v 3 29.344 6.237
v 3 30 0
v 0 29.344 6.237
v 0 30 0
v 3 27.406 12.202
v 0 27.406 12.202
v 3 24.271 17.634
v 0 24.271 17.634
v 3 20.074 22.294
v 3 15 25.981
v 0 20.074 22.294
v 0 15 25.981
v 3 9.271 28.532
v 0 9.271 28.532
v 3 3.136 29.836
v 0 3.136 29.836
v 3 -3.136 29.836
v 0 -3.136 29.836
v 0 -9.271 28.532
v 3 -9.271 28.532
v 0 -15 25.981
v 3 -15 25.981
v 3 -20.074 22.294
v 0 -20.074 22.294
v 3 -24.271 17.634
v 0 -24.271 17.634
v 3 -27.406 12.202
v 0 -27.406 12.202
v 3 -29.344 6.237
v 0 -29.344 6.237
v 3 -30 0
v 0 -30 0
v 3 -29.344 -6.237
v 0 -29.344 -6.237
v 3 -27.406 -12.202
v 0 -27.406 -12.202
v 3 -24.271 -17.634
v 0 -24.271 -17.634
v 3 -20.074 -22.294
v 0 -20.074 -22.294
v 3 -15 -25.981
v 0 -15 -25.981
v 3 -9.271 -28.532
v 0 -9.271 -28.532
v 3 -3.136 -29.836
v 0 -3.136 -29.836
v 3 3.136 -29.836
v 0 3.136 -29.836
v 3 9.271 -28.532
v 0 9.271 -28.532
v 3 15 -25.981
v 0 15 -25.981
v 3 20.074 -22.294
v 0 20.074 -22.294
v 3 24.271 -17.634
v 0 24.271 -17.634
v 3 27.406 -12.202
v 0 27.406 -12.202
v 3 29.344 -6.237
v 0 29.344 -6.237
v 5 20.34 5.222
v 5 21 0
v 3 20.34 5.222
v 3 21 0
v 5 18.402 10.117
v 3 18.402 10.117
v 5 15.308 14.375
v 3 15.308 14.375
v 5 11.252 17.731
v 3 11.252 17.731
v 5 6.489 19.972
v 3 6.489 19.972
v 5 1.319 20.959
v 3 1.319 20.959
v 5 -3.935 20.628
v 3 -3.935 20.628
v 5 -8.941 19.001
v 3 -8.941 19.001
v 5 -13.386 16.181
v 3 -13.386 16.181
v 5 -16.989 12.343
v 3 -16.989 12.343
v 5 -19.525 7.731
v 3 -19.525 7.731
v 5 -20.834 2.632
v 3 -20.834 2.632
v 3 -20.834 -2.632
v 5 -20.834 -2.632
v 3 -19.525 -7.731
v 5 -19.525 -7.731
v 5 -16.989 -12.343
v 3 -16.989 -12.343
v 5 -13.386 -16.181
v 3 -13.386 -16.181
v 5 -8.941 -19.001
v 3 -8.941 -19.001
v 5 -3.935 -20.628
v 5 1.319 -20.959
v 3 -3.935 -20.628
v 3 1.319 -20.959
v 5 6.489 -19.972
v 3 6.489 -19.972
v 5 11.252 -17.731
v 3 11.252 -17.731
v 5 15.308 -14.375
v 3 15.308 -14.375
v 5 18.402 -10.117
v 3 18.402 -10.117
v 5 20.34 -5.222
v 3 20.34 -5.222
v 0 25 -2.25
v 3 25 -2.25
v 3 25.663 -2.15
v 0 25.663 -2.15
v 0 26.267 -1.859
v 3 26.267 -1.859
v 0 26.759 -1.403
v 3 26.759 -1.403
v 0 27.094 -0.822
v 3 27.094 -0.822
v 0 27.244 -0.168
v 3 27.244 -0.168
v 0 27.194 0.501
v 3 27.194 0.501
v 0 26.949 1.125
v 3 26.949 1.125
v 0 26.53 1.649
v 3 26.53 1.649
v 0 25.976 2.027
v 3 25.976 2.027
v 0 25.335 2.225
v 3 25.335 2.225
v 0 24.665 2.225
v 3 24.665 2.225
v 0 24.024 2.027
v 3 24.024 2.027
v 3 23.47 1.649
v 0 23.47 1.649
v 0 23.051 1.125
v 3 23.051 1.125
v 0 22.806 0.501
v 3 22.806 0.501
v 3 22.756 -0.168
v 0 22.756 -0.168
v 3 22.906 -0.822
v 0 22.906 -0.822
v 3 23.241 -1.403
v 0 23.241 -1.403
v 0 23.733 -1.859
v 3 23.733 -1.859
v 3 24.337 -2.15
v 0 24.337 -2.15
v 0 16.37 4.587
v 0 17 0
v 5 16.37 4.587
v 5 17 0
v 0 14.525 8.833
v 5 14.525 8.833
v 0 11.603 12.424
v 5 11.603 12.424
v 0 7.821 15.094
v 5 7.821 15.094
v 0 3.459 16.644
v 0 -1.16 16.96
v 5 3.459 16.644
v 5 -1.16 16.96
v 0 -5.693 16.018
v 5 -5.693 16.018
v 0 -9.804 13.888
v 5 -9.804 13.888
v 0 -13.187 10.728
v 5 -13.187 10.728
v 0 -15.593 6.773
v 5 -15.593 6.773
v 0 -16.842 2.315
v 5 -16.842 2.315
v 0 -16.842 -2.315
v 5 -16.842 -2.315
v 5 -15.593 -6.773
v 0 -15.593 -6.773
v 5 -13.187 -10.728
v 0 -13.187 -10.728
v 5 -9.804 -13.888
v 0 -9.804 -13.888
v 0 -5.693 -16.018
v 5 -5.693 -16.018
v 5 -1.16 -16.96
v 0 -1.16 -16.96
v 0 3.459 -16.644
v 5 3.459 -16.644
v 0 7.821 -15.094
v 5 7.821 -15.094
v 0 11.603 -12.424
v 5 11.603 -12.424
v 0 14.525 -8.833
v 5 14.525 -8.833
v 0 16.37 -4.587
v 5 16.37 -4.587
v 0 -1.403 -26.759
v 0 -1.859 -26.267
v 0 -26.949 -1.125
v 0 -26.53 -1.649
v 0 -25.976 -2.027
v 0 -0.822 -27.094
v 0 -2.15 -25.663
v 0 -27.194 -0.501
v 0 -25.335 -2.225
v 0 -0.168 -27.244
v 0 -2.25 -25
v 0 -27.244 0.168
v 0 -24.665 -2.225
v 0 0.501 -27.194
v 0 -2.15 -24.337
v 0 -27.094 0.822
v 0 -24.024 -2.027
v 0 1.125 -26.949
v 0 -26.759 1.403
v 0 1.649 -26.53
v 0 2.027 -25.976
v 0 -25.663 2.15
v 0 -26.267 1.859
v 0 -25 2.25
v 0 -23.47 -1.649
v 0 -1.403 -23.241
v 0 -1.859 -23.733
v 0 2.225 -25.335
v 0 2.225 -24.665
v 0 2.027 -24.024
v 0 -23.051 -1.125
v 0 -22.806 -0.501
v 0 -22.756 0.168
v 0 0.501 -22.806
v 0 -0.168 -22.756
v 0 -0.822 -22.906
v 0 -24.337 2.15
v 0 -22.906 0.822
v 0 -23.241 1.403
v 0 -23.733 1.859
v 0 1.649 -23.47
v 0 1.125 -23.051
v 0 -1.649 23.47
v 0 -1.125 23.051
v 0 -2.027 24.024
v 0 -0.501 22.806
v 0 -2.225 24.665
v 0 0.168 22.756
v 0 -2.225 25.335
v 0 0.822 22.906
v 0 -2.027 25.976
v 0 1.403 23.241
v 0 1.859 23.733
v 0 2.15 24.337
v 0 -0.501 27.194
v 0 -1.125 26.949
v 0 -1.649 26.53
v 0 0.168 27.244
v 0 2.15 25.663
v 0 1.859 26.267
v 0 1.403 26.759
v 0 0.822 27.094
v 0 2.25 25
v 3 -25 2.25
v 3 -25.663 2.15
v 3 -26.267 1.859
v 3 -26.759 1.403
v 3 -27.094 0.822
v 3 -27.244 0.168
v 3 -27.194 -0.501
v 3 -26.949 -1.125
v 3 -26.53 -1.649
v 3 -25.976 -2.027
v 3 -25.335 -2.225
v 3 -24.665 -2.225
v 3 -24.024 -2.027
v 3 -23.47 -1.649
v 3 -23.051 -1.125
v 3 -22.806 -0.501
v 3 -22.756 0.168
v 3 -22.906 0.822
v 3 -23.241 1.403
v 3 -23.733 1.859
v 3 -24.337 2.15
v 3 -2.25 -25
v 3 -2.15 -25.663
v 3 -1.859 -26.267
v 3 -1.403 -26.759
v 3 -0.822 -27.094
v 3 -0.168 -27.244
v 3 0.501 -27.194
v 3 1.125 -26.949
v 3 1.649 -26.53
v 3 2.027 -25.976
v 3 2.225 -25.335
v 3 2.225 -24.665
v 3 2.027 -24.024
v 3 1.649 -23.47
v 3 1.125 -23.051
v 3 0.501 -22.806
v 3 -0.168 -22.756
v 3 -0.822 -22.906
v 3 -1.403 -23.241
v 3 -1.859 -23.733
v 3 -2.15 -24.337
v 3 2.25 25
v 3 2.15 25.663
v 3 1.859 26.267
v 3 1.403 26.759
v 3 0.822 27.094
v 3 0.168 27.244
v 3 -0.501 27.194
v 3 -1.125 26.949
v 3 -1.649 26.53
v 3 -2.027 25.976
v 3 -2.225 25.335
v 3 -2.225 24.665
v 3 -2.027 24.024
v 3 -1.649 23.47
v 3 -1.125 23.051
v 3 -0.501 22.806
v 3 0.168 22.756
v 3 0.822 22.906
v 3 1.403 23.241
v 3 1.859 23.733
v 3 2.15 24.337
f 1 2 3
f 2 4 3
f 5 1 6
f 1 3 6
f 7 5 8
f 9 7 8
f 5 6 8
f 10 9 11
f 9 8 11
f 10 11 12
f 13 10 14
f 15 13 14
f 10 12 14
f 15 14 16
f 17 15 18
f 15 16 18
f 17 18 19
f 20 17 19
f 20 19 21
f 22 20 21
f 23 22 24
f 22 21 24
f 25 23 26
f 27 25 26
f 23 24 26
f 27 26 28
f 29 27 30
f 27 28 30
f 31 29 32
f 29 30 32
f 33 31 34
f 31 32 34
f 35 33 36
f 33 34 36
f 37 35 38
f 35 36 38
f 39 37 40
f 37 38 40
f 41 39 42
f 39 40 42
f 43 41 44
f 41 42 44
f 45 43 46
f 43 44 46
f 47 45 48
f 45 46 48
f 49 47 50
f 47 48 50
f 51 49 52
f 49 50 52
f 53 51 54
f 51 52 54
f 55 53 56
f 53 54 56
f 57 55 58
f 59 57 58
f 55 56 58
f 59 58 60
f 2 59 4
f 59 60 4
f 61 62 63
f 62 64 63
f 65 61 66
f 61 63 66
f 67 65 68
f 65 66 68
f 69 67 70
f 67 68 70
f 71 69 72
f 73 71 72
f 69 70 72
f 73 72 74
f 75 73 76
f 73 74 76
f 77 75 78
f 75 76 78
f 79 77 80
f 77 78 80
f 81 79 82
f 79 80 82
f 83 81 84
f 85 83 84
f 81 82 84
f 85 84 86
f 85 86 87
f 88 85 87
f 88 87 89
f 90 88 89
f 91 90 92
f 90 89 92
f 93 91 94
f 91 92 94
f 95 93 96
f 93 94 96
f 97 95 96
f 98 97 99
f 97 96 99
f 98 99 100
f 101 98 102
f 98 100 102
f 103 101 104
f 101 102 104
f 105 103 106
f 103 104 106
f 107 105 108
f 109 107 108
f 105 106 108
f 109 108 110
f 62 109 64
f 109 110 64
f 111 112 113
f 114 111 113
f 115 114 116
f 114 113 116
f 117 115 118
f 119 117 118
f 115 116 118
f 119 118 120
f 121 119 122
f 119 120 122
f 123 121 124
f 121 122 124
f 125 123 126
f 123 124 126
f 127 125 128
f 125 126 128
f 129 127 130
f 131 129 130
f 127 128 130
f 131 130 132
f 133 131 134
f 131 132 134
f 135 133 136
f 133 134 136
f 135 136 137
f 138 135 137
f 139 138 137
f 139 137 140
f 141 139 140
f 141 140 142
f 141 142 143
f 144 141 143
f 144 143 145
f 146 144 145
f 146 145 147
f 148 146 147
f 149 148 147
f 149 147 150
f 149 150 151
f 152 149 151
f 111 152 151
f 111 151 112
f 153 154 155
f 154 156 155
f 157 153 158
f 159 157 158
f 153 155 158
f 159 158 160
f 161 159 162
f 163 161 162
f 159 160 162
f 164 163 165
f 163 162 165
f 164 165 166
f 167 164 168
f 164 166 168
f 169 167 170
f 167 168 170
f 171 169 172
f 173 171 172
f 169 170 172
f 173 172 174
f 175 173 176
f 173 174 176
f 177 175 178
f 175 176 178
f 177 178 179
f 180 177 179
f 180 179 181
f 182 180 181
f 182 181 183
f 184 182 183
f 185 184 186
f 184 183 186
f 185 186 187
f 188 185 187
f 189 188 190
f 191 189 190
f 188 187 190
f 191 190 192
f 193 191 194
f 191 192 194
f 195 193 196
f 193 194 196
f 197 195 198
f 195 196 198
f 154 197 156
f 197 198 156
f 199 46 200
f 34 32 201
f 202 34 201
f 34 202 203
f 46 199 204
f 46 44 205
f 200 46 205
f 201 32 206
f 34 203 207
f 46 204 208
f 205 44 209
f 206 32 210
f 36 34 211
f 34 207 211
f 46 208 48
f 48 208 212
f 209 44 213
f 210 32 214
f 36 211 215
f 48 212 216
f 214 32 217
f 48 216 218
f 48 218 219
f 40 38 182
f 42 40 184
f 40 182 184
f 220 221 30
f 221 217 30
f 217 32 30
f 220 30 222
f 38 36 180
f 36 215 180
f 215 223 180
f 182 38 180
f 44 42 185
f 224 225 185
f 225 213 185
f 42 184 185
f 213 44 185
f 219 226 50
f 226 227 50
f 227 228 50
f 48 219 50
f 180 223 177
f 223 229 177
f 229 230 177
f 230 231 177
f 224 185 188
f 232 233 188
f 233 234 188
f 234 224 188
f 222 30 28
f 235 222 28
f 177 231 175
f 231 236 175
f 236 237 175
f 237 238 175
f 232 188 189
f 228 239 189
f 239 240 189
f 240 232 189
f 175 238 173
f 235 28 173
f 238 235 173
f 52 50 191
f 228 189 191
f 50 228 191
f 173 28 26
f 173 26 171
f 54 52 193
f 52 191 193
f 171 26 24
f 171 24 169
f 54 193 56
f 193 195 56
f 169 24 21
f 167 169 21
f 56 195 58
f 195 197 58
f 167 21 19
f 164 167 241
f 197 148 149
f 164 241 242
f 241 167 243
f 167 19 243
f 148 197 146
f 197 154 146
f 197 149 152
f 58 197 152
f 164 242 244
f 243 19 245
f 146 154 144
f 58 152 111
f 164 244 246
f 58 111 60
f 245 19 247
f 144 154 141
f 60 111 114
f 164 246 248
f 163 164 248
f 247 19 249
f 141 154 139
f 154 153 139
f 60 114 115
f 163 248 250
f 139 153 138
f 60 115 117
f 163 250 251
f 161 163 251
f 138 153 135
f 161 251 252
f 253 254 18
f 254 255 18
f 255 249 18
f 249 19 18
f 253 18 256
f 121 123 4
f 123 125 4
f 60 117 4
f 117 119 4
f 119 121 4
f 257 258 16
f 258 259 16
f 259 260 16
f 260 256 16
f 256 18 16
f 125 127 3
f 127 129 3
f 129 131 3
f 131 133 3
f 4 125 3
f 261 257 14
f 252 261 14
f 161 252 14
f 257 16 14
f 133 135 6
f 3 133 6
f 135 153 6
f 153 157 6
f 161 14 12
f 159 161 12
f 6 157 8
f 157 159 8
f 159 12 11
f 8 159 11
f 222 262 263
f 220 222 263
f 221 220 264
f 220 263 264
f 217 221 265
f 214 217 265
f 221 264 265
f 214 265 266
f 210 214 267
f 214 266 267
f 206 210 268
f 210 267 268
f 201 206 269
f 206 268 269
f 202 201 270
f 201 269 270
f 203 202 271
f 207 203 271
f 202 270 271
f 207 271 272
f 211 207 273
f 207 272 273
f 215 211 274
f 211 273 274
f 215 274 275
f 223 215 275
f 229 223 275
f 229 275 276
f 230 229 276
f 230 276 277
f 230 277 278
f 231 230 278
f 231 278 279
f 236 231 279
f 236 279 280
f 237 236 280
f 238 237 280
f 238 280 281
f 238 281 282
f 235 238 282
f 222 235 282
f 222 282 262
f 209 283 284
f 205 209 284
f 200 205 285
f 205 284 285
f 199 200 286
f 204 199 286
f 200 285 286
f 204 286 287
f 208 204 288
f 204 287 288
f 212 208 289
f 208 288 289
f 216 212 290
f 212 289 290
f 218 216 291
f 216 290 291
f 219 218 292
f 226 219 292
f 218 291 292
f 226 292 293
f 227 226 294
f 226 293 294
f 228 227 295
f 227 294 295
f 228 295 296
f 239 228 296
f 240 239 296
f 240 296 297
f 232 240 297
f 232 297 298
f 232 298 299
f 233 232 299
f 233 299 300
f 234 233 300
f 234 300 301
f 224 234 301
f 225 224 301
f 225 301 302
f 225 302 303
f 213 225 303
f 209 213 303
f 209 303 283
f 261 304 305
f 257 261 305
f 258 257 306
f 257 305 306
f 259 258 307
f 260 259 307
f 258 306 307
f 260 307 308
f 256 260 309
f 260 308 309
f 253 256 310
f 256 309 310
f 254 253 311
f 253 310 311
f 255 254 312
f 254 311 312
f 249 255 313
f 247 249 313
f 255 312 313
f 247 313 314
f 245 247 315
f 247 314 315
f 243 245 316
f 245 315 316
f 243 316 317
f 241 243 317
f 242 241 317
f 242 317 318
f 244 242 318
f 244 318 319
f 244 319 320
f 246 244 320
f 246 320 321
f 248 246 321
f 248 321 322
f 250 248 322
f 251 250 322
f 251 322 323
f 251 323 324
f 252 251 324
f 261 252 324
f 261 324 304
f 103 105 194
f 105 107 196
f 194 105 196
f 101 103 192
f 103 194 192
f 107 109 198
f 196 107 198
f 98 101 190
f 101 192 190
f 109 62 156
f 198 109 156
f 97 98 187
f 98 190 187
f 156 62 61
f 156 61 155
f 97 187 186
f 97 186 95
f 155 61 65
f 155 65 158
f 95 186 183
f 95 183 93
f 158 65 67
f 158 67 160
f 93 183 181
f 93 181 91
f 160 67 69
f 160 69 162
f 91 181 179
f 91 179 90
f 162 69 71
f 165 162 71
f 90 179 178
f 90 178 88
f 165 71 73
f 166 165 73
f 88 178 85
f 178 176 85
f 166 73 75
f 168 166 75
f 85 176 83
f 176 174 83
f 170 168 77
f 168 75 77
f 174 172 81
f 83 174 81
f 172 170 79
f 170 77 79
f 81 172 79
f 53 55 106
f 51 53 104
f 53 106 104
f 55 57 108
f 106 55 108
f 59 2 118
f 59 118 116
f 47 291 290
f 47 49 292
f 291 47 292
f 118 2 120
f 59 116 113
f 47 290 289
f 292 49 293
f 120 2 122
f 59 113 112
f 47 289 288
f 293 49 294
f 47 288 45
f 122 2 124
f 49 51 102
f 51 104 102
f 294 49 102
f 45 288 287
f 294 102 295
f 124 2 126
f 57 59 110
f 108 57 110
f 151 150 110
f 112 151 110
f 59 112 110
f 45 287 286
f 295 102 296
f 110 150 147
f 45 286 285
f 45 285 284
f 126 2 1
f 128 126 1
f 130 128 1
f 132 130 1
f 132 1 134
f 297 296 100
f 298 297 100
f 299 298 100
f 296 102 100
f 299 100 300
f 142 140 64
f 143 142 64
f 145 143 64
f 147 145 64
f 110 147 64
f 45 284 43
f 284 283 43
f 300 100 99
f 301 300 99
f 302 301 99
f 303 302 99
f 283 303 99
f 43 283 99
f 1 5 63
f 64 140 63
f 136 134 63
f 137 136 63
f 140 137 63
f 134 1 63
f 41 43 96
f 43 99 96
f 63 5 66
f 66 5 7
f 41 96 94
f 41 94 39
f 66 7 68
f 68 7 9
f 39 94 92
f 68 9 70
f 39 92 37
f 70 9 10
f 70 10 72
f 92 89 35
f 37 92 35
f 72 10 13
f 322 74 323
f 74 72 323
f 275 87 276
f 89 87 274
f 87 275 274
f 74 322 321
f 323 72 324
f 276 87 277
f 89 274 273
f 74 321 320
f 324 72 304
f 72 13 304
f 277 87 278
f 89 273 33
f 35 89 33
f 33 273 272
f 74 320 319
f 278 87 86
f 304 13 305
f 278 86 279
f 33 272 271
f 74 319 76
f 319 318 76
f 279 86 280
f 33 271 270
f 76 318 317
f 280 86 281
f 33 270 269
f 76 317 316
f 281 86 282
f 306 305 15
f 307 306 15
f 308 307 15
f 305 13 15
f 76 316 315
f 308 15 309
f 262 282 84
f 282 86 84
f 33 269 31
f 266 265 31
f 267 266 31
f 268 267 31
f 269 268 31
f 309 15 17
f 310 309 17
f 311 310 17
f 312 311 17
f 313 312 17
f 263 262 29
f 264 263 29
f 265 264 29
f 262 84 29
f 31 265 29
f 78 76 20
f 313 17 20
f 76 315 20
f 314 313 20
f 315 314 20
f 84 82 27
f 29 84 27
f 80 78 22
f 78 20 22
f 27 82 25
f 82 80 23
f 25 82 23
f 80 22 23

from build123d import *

# Parameters (mm, degrees)
M4_CLEARANCE_HOLE1_D     = 4.5
M4_CLEARANCE_HOLE1_DEPTH = 3.001
CIRPATTERN1_COUNT        = 4


with BuildPart() as part:
    # Sketch1 → Revolve1 (revolve)
    with BuildSketch(Plane.XY):
        Polygon((0, 17), (5, 17), (5, 21), (3, 21), (3, 30), (0, 30), align=None)
    revolve(axis=Axis((0, 0, 0), (1, 0, 0)))

    # M4 Clearance Hole1
    with Locations(Plane.ZY):
        with Locations((0, 25)):
            m4_clearance_hole1 = Hole(M4_CLEARANCE_HOLE1_D / 2, depth=M4_CLEARANCE_HOLE1_DEPTH)

    # CirPattern1: M4 Clearance Hole1 ×4 about axis
    cirpattern1_axis = Axis((0, 0, 0), (1, 0, 0))
    for i in range(1, CIRPATTERN1_COUNT):
        add(m4_clearance_hole1.rotate(cirpattern1_axis, i * 360 / CIRPATTERN1_COUNT), mode=Mode.SUBTRACT)


solid = part.part
